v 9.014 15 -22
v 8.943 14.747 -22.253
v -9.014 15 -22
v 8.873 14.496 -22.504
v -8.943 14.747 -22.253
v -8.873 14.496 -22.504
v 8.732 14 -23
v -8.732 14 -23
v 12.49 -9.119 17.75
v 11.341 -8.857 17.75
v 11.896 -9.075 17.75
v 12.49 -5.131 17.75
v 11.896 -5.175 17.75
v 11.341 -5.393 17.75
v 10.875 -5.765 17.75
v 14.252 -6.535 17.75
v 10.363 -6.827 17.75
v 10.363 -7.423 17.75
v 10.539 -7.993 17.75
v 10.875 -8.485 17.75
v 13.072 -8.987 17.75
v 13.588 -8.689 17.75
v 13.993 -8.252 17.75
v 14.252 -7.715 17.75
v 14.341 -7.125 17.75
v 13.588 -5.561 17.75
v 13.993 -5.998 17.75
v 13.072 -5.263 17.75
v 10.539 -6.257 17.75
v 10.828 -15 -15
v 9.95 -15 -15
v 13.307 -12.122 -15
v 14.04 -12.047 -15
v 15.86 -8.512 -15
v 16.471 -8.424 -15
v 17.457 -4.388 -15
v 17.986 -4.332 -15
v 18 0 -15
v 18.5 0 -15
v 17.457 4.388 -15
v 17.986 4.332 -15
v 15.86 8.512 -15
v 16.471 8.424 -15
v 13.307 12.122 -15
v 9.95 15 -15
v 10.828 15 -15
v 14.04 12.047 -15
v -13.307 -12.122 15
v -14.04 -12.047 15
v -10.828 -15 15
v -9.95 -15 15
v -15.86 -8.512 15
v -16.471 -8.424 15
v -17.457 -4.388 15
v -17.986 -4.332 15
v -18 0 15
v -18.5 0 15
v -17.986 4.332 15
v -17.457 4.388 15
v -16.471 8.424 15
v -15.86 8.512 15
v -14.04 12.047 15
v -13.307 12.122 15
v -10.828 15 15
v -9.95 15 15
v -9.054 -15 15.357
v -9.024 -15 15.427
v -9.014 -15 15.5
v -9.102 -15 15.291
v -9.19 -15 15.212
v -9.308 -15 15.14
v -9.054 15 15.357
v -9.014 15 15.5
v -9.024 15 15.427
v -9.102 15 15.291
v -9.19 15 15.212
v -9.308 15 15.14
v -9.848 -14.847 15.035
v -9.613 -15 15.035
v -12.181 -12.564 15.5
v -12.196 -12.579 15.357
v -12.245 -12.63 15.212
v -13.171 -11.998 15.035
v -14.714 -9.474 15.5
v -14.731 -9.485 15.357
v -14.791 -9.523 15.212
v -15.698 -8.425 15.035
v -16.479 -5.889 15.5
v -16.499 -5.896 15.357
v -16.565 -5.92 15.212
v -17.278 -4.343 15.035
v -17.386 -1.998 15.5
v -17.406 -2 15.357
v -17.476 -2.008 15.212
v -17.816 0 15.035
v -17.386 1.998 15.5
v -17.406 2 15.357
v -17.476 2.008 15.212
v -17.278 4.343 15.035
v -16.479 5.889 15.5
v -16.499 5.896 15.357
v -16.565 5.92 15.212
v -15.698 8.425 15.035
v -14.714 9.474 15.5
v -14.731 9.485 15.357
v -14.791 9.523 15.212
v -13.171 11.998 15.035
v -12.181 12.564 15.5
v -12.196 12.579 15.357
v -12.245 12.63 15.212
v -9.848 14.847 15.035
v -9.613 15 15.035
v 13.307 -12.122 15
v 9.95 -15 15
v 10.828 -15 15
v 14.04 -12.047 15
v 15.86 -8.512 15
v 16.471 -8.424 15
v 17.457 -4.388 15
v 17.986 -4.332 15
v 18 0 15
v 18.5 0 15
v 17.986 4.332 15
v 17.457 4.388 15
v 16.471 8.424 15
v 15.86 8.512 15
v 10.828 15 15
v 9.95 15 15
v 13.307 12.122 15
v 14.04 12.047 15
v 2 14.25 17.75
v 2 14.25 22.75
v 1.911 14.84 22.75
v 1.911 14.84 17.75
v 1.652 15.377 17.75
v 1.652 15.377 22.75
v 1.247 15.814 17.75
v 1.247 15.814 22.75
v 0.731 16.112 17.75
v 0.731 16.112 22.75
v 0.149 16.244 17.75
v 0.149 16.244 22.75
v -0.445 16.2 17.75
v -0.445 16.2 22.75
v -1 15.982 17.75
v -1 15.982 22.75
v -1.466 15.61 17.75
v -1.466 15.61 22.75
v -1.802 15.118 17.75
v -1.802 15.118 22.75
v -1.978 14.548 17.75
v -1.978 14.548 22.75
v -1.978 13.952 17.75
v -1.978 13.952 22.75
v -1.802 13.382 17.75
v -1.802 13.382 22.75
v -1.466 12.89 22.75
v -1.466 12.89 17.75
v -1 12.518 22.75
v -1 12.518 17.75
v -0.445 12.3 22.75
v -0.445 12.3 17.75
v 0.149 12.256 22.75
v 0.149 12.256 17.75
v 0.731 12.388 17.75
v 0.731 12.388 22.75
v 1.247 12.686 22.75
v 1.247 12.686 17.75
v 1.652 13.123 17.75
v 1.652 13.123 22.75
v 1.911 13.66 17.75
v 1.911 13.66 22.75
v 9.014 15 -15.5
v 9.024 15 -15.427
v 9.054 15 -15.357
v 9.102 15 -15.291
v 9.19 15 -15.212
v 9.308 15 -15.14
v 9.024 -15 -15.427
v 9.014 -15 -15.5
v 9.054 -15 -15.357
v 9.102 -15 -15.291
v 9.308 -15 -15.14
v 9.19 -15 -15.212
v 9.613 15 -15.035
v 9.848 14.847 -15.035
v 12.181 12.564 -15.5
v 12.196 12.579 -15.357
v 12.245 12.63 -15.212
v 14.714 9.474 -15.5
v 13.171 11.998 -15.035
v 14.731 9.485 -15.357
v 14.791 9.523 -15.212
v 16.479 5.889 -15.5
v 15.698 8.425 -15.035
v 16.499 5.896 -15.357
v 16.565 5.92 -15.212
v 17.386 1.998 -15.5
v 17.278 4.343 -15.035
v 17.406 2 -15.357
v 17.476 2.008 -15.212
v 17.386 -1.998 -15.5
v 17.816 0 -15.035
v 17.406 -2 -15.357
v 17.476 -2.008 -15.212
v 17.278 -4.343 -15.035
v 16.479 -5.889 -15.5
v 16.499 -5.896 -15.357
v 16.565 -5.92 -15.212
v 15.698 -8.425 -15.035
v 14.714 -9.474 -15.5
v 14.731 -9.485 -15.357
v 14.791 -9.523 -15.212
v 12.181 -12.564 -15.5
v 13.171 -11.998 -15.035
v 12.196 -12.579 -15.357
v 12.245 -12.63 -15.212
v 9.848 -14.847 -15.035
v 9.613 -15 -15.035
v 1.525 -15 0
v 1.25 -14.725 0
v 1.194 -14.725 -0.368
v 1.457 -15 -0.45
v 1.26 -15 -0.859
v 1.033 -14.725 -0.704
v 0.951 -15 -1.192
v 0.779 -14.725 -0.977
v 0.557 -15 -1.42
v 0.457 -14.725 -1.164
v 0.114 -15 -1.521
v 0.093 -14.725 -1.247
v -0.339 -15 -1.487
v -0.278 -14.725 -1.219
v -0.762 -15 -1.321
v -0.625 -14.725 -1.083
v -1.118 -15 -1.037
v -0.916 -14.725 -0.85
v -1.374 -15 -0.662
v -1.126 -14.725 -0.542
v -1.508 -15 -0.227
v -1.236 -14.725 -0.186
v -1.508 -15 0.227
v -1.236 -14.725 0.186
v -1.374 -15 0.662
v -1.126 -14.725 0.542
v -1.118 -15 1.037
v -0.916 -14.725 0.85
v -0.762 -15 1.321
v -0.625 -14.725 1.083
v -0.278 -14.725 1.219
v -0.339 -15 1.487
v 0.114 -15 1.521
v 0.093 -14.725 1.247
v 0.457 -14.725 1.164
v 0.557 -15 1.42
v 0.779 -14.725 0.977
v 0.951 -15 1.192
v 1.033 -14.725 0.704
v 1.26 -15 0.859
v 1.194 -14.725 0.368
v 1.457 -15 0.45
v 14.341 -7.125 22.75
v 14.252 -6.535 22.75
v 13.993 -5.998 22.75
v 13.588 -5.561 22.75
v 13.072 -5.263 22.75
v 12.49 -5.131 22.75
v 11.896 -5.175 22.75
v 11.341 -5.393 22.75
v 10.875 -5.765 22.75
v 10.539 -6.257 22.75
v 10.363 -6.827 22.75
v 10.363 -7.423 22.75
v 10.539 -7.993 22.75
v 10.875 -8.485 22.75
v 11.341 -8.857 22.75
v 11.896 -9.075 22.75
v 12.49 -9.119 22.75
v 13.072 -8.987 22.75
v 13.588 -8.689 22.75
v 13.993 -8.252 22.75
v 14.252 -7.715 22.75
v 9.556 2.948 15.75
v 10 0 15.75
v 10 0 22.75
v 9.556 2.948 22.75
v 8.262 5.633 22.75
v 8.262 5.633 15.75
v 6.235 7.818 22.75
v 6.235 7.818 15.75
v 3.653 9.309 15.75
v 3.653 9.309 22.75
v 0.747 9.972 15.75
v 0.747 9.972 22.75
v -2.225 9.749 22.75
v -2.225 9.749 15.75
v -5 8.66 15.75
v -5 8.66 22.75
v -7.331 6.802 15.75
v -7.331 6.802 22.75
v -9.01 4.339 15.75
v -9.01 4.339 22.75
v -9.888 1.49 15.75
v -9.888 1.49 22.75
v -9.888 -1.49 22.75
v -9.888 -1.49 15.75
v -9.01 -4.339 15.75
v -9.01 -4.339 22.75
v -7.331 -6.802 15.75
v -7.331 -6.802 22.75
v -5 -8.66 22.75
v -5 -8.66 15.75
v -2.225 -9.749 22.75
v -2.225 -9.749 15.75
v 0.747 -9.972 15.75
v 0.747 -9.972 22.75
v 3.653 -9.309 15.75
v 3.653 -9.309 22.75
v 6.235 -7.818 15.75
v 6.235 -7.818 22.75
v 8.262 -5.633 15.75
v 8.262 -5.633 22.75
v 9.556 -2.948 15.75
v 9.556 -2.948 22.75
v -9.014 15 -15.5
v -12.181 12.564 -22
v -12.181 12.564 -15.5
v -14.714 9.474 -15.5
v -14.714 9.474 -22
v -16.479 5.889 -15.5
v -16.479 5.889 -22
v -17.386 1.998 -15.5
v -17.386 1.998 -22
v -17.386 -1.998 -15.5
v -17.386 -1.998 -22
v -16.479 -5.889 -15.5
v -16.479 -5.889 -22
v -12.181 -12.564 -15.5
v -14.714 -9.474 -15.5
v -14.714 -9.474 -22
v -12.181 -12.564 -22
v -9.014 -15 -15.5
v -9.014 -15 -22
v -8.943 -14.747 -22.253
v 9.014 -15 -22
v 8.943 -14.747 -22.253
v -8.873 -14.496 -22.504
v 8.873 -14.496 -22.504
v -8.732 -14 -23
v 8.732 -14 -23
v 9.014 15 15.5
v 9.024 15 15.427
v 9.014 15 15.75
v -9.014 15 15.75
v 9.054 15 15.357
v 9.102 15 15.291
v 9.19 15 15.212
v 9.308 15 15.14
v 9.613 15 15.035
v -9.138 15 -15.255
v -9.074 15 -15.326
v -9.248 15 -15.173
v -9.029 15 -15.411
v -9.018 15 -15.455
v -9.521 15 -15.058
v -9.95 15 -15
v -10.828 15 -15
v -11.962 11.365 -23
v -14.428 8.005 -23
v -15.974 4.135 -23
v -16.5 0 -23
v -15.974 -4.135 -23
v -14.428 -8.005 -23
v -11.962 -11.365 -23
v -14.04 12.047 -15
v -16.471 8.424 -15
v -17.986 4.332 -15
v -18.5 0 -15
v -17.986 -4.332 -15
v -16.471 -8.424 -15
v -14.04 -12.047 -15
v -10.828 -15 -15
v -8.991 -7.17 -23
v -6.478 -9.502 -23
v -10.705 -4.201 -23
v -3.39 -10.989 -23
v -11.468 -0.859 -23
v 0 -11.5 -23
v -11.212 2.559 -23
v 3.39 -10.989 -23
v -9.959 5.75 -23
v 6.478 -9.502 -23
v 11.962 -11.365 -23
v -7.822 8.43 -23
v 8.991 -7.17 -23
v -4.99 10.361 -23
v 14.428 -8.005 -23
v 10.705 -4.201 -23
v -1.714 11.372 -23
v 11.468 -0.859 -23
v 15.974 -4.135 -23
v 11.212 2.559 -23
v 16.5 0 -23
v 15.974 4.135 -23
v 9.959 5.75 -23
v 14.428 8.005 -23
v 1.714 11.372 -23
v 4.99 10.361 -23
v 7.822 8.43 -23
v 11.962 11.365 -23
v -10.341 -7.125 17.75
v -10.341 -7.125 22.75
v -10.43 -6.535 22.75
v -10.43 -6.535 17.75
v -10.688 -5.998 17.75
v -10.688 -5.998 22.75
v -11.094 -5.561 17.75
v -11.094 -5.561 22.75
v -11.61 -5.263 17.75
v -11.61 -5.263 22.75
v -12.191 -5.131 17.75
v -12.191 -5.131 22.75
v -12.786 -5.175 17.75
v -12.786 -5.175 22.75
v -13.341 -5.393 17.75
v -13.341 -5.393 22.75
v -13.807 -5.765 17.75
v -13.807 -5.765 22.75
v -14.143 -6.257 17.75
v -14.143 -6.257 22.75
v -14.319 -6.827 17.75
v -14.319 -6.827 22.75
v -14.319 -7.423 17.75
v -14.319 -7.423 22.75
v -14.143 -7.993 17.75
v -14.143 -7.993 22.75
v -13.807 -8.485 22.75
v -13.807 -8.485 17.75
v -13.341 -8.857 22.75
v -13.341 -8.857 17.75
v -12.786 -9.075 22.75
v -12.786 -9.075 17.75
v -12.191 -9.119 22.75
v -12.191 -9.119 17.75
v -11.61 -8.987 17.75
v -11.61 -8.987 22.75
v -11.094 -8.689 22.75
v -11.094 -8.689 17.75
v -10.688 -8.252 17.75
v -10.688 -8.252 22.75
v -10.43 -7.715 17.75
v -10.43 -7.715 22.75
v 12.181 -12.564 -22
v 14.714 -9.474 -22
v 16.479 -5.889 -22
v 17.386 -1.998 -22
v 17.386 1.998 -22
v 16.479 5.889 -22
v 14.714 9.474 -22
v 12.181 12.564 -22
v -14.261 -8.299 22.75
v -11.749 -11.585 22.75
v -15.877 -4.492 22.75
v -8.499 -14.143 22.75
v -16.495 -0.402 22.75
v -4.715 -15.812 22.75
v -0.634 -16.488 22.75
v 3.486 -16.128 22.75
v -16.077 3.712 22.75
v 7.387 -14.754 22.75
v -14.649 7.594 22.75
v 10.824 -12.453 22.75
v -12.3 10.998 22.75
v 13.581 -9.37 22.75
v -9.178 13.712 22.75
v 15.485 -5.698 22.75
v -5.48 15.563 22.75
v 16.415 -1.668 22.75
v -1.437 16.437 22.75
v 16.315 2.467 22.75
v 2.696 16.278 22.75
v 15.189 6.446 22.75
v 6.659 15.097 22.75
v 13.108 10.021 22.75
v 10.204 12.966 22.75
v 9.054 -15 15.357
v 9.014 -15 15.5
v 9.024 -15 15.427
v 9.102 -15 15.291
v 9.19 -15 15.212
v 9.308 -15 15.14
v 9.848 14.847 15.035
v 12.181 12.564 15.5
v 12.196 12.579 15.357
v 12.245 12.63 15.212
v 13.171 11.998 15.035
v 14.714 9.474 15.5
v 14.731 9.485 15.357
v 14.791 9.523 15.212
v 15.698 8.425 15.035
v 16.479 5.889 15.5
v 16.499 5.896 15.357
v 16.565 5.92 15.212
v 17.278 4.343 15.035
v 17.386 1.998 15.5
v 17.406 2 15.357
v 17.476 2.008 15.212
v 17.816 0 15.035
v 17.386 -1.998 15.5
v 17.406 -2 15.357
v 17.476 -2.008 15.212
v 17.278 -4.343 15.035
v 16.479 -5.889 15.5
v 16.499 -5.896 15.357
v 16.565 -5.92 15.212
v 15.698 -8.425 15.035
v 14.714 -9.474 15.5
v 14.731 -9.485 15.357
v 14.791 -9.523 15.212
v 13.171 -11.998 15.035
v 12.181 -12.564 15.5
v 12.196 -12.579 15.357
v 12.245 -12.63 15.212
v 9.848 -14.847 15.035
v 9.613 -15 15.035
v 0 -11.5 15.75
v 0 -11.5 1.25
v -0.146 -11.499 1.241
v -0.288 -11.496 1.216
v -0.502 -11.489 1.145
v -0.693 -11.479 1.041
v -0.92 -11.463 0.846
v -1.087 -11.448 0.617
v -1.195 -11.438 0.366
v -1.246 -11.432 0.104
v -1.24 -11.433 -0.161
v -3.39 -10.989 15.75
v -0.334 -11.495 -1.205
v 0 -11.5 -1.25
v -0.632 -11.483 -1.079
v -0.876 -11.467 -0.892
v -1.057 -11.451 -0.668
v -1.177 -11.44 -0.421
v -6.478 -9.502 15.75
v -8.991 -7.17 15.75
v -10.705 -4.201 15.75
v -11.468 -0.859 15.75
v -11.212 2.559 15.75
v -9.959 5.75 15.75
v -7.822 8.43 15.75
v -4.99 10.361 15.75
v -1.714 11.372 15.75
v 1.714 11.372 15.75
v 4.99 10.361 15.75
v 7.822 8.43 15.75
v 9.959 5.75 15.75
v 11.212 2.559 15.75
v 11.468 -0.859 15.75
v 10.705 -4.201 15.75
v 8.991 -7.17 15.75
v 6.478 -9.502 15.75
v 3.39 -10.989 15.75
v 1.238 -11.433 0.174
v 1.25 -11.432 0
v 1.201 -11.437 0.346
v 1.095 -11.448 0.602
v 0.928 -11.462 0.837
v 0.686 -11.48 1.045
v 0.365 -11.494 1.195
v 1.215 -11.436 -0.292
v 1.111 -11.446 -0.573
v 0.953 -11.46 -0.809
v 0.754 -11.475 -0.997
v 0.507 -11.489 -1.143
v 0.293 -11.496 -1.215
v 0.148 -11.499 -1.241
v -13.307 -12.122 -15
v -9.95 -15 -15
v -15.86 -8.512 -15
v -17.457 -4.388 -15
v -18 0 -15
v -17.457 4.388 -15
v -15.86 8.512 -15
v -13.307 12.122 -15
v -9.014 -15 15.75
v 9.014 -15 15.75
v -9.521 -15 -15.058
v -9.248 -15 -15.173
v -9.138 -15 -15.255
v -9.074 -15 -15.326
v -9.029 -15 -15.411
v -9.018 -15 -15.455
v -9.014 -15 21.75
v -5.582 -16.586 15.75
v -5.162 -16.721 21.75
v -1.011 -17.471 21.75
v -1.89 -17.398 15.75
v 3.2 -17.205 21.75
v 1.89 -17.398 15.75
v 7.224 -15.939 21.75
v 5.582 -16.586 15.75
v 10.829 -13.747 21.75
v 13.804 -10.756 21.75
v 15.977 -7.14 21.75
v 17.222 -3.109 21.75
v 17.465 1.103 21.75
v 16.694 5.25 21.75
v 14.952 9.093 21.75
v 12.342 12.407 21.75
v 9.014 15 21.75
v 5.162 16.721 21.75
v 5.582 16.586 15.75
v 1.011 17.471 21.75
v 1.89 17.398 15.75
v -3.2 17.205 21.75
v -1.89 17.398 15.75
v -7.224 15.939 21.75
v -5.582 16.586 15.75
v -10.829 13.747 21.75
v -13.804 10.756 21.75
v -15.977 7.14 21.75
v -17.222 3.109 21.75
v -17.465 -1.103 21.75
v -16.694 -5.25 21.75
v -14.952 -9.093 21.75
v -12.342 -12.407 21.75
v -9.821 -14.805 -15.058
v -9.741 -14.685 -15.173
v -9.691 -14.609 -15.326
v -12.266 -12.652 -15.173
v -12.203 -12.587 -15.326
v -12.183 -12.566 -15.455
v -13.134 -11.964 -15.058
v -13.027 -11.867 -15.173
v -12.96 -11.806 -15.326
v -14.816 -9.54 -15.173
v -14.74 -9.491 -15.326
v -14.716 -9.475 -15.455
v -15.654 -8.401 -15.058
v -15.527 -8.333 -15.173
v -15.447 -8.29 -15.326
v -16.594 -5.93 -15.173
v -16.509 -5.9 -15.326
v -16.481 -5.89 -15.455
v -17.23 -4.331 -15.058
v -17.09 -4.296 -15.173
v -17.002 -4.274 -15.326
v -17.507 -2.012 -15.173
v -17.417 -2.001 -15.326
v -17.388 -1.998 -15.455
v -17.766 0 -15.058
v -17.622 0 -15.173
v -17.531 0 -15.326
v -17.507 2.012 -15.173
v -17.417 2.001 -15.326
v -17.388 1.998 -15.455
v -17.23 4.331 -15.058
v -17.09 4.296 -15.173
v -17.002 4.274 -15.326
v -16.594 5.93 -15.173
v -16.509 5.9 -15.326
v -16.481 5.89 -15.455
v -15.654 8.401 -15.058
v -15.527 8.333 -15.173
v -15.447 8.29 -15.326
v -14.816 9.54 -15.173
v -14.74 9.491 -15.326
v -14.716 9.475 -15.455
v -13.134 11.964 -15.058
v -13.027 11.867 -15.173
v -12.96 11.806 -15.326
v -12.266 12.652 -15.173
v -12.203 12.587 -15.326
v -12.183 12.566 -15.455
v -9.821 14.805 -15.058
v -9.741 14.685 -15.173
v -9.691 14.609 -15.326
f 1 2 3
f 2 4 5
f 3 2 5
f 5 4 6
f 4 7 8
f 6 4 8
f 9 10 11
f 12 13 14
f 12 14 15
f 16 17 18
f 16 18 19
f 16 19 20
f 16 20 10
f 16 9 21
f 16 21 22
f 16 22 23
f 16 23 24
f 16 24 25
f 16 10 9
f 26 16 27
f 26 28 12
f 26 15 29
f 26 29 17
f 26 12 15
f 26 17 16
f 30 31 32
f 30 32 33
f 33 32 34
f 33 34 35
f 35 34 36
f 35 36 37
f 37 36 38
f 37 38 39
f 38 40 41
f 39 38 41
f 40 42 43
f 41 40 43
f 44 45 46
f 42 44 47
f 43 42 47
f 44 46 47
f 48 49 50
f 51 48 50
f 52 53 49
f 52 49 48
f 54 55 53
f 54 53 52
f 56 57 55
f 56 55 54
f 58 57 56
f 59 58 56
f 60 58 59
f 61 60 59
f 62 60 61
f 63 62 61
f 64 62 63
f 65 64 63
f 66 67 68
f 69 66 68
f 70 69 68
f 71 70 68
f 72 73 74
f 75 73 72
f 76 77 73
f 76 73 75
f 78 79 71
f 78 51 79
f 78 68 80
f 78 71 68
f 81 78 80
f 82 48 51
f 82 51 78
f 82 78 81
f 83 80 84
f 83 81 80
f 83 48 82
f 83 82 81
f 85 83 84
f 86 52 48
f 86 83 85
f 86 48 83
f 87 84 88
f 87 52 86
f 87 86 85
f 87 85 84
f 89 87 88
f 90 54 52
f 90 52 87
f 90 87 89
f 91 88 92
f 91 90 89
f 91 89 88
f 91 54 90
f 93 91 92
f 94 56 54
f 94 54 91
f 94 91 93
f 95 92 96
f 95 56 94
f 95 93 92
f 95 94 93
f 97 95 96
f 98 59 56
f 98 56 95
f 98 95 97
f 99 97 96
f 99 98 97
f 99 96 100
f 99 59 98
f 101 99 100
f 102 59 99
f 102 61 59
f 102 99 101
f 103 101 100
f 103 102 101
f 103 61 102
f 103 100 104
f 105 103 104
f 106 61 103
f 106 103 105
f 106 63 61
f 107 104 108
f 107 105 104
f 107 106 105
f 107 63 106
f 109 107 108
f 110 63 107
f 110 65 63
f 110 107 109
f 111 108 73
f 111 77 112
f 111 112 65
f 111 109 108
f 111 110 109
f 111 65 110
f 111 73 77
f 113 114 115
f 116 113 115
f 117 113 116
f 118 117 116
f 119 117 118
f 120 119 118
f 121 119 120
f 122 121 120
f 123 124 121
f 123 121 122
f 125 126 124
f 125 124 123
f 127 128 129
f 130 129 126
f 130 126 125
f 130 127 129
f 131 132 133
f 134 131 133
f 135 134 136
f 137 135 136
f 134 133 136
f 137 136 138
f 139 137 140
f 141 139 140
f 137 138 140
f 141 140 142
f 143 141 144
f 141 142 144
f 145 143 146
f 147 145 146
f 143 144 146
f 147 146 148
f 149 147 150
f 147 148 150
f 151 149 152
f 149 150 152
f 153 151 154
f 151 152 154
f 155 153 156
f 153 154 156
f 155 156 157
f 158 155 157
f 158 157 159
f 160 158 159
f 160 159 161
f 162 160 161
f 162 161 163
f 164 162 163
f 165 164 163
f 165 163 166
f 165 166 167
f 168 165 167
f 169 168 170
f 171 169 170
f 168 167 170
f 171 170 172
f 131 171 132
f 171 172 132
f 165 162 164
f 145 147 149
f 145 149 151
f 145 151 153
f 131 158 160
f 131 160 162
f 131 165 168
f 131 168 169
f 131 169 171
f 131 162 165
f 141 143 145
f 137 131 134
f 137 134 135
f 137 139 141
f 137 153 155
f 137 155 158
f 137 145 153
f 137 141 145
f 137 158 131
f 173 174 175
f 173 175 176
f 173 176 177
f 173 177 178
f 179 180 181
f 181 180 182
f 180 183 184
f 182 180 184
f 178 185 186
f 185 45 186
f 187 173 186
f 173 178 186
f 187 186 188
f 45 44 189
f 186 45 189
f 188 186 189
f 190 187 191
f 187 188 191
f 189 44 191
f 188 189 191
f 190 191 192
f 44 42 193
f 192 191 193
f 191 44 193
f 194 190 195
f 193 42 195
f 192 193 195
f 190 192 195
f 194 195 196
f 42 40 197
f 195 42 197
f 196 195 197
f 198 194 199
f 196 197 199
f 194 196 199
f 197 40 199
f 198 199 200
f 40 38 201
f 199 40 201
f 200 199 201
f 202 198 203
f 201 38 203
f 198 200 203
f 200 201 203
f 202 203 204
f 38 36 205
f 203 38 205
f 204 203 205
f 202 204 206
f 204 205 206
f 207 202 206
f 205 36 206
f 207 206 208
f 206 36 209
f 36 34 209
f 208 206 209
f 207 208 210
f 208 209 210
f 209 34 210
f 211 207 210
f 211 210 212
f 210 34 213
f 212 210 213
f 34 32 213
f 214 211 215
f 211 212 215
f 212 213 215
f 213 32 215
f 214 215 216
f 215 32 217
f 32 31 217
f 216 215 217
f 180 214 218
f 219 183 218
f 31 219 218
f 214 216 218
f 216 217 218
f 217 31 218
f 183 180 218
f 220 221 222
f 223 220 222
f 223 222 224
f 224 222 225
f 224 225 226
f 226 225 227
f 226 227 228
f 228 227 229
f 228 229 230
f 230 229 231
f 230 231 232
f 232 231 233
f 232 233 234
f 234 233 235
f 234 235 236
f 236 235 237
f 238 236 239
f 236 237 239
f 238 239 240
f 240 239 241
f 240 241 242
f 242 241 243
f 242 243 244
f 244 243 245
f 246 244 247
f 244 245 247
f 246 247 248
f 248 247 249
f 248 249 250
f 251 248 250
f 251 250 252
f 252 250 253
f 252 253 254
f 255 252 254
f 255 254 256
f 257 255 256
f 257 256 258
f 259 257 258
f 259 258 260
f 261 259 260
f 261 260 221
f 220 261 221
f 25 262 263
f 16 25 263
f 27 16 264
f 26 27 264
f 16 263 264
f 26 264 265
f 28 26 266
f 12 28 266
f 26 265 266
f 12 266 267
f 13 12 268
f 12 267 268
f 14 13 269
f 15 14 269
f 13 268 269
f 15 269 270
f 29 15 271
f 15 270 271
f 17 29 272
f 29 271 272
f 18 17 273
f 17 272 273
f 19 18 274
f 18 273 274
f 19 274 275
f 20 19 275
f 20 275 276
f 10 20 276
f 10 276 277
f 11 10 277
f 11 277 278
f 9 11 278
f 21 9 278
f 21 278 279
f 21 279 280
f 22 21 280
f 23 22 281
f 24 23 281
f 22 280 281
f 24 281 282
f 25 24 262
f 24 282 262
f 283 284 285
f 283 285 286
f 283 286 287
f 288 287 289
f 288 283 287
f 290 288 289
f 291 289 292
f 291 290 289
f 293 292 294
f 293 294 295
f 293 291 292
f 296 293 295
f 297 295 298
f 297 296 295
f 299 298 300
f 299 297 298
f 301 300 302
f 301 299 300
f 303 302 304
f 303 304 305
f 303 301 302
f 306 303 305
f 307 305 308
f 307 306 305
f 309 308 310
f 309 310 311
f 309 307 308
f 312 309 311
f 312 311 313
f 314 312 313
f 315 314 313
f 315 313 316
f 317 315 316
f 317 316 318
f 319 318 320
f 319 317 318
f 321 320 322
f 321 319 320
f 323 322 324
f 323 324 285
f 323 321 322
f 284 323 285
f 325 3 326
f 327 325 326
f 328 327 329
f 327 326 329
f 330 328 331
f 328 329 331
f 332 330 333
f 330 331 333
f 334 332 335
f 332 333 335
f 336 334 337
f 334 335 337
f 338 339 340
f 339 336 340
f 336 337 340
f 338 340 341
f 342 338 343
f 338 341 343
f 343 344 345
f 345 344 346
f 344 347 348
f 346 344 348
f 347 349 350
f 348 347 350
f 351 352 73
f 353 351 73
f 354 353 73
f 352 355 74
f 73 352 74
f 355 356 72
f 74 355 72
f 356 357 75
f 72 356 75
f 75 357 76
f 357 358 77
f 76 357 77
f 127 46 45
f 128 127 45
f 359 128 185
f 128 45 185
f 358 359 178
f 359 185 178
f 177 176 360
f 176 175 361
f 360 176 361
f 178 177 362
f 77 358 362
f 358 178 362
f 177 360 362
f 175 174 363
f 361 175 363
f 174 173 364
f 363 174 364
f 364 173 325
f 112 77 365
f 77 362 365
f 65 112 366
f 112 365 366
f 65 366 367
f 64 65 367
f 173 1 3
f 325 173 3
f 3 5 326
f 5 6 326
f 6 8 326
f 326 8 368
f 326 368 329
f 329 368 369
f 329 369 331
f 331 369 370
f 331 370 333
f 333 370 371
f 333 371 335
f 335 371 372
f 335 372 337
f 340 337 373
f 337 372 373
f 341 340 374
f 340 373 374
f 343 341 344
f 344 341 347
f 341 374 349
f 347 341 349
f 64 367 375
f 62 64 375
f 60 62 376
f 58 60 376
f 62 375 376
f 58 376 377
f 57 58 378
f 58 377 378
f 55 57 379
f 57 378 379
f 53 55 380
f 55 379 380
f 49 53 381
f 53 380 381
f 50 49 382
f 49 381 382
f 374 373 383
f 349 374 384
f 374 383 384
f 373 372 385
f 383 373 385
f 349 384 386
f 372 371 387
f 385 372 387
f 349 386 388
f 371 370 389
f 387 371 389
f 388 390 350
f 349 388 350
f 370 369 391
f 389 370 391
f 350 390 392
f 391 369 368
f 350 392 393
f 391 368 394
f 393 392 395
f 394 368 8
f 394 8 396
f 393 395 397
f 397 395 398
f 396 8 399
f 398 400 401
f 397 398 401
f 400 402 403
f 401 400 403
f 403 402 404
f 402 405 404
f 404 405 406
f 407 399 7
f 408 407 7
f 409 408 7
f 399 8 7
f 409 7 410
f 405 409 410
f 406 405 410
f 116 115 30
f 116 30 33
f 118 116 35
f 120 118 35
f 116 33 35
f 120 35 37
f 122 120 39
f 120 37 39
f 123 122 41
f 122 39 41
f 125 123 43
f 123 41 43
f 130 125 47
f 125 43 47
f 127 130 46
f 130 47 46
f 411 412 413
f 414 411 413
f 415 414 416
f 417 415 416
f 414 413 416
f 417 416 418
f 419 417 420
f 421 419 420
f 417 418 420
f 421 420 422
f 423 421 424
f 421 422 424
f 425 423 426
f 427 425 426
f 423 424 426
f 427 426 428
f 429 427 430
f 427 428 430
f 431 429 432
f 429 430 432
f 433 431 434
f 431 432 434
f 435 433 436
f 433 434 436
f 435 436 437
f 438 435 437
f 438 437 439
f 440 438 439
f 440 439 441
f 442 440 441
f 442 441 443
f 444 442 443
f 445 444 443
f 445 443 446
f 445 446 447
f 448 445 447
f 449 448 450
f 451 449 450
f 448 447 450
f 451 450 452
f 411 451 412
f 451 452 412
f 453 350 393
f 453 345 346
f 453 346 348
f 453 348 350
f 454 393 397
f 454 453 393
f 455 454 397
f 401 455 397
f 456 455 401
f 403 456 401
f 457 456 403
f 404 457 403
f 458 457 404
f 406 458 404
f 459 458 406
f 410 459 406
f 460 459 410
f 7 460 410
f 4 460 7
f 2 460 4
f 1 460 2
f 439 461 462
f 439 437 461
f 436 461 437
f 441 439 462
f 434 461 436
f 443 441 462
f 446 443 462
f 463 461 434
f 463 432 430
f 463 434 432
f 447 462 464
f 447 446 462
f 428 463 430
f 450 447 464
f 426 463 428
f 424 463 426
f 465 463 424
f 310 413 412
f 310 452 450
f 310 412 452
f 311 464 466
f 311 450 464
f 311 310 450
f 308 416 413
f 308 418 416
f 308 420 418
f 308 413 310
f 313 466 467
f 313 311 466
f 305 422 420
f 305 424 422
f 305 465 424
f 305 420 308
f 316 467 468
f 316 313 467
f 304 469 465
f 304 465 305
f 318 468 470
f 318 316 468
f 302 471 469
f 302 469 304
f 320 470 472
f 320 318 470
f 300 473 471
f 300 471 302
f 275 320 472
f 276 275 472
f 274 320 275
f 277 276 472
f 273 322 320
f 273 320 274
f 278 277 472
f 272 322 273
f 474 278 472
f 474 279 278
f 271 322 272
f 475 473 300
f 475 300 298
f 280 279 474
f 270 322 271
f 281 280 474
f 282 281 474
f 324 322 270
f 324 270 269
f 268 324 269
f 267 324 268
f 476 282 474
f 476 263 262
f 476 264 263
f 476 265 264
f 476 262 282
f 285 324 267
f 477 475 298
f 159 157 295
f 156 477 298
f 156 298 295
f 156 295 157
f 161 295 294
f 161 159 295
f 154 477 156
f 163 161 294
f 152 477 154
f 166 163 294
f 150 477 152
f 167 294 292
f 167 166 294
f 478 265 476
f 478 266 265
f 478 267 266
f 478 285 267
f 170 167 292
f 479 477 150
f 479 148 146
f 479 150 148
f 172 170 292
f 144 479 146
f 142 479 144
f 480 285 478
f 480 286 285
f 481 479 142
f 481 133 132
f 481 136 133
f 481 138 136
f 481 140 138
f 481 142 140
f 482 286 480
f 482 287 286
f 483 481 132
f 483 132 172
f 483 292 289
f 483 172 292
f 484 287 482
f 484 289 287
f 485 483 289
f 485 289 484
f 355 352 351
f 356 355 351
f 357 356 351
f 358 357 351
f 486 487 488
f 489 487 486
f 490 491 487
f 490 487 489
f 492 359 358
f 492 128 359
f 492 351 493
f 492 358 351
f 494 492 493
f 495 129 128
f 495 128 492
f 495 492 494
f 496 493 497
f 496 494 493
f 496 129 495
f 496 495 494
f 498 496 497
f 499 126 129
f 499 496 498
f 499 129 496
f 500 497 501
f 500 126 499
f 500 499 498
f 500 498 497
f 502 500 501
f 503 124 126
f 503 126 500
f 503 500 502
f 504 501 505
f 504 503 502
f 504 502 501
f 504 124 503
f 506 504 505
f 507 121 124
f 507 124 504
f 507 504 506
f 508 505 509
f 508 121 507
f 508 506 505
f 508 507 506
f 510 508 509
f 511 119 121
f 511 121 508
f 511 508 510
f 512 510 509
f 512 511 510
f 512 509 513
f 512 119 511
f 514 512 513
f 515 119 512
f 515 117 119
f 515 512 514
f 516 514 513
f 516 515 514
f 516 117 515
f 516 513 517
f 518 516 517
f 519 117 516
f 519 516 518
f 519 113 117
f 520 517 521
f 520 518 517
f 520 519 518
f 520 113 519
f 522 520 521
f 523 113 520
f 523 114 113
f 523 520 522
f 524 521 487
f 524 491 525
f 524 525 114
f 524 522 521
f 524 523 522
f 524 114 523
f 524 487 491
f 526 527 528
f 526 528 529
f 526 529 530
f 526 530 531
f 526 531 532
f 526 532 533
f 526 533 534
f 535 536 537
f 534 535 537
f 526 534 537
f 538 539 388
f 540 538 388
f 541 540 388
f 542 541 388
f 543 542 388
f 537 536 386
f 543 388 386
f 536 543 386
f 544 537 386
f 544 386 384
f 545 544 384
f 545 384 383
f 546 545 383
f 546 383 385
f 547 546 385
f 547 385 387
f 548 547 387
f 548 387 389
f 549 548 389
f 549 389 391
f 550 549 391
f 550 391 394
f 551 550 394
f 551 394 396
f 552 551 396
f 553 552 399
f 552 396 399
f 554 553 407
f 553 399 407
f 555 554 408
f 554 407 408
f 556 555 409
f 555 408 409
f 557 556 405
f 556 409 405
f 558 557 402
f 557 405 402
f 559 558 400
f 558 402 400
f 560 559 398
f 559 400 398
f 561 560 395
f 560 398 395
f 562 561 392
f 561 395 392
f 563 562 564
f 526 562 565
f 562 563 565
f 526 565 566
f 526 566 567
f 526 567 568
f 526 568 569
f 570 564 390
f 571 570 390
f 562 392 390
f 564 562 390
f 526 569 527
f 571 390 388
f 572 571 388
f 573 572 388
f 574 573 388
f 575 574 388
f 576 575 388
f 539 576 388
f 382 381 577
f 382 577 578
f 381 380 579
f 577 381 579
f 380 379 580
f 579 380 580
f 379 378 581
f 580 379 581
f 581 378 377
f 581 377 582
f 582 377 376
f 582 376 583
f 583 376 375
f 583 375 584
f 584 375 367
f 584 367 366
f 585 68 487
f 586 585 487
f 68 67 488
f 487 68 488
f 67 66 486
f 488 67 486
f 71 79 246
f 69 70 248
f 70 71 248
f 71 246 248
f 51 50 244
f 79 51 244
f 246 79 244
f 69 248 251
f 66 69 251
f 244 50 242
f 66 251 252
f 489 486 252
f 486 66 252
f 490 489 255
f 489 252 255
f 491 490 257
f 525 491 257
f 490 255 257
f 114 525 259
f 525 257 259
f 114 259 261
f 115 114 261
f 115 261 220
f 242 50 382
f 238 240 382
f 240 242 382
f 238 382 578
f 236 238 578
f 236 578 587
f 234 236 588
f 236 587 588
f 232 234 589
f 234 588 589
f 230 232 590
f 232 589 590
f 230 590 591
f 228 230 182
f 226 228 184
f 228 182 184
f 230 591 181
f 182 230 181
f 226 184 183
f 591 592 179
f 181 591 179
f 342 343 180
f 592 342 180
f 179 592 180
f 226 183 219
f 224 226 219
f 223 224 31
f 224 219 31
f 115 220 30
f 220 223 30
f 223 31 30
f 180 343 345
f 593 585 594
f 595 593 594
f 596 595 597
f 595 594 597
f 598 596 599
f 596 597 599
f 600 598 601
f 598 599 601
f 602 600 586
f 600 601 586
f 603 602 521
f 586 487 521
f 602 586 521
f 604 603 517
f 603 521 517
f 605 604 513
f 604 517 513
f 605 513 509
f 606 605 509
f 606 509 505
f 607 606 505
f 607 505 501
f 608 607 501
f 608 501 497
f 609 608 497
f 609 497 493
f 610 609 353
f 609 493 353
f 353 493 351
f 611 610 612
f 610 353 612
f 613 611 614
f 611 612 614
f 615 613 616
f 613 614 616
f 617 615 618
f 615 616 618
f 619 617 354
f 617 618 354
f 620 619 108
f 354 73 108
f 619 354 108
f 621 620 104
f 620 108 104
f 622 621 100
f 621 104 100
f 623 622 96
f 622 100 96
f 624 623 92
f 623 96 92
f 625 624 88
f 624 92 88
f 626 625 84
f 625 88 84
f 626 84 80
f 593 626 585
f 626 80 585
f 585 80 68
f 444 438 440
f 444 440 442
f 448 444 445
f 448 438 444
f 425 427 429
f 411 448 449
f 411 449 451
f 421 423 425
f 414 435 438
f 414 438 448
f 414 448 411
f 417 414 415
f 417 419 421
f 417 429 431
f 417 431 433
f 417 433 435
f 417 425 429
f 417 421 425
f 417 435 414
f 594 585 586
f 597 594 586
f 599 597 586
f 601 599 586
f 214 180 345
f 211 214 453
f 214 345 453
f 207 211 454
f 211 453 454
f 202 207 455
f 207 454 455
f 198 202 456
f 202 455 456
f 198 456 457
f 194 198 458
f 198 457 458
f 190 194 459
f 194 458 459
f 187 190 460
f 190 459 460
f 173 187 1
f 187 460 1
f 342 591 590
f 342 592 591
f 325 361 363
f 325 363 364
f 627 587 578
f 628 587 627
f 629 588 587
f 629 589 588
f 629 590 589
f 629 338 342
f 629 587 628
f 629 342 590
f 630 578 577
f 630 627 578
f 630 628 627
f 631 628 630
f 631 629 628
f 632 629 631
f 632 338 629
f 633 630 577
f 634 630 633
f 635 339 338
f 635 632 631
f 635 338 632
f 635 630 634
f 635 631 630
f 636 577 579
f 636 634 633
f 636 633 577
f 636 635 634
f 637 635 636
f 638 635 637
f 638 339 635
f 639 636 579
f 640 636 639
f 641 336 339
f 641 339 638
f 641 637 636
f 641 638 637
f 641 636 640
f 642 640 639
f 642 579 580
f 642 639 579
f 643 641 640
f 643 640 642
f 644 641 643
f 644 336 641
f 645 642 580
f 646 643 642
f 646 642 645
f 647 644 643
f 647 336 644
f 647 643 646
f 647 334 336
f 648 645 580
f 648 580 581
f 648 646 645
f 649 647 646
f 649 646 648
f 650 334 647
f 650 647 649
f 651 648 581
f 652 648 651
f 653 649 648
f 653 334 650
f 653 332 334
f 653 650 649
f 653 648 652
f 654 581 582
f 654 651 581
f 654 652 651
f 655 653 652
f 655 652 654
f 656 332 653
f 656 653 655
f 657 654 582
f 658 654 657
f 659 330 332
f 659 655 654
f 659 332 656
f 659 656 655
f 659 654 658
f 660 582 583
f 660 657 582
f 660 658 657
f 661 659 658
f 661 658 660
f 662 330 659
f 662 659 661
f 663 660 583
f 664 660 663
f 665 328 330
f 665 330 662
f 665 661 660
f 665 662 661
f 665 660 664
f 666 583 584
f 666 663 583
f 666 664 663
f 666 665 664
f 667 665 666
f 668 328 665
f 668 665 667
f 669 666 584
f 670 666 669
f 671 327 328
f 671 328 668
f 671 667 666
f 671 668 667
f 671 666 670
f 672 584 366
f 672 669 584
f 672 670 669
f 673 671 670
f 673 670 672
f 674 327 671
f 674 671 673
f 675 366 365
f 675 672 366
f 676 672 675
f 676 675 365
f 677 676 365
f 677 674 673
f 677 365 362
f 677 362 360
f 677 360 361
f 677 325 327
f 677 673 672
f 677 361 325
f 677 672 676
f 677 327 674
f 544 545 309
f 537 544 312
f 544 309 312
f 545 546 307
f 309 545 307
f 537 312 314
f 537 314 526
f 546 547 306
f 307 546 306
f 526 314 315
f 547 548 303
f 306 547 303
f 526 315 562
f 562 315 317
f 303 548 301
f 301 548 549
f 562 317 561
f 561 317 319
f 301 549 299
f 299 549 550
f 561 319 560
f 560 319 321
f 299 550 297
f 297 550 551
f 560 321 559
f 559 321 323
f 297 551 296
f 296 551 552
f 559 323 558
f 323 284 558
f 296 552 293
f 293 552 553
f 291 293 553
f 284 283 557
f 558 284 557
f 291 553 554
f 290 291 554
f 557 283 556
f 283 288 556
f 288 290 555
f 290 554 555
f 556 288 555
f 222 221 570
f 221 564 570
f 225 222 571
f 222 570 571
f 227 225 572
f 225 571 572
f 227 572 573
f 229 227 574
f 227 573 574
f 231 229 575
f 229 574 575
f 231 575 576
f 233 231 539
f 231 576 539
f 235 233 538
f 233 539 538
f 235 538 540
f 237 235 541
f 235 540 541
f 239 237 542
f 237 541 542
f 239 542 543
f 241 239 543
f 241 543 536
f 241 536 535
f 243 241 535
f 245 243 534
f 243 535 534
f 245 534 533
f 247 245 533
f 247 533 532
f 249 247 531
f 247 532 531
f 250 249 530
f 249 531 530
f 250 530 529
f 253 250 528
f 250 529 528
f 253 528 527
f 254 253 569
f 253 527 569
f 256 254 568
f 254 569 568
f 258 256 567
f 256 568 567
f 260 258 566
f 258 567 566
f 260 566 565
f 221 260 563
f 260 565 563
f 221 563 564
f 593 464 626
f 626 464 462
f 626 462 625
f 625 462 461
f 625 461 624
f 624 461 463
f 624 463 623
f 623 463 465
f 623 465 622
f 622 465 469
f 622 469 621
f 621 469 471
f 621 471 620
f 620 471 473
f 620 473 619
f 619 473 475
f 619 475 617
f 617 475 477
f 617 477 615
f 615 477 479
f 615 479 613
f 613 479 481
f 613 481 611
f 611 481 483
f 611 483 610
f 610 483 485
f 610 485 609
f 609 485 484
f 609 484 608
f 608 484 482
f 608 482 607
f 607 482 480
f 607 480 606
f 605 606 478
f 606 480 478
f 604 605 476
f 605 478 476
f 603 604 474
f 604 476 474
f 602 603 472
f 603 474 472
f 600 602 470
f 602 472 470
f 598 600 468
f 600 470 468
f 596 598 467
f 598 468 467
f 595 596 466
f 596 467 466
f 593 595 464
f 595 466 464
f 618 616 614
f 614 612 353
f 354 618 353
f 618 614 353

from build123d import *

# Parameters (mm, degrees)
BOSS_EXTRUDE1_DEPTH         = 22.75
BOSS_EXTRUDE1_DEPTH_BACK    = 23
SKETCH1_R                   = 11.5
BOSS_EXTRUDE2_DEPTH         = 15
BOSS_EXTRUDE2_DEPTH_BACK    = 15
BOSS_EXTRUDE3_START         = -7
SKETCH5_R                   = 17.5
SKETCH5_R_2                 = 10
BOSS_EXTRUDE3_DEPTH         = 7
SKETCH6_R                   = 2
CUT_EXTRUDE1_DEPTH          = 5
M3_TAPPED_HOLE1_D           = 2.5
M3_TAPPED_HOLE1_DEPTH       = 7.5
M3_TAPPED_HOLE1_CSINK_D     = 3.05
M3_TAPPED_HOLE1_CSINK_ANGLE = 90
M3_TAPPED_HOLE1_TIP         = 0.751075774
FILLET2_R                   = 0.5
CHAMFER1_SIZE               = 1
CHAMFER2_SIZE               = 1


with BuildPart() as part:
    # Sketch1 → Boss-Extrude1 (new, two sides: drawn at the far end of the back side and taken through both)
    with BuildSketch(Plane.XY.offset(-BOSS_EXTRUDE1_DEPTH_BACK)):
        with BuildLine():
            Line((9.013878189, 15), (-9.013878189, 15))
            ThreePointArc((-9.013878189, 15), (-17.5, 0), (-9.013878189, -15))
            Line((-9.013878189, -15), (9.013878189, -15))
            ThreePointArc((9.013878189, -15), (17.5, 0), (9.013878189, 15))
        make_face()
        Circle(SKETCH1_R, mode=Mode.SUBTRACT)
    extrude(amount=BOSS_EXTRUDE1_DEPTH + BOSS_EXTRUDE1_DEPTH_BACK)

    # Sketch1<23> → Boss-Extrude2 (add, two sides: drawn at the far end of the back side and taken through both)
    with BuildSketch(Plane.XY.offset(-BOSS_EXTRUDE2_DEPTH_BACK)):
        with BuildLine():
            Line((-9.013878189, 15), (-10.828203914, 15))
            ThreePointArc((-10.828203914, 15), (-18.5, 0), (-10.828203914, -15))
            Line((-10.828203914, -15), (-9.013878189, -15))
            ThreePointArc((-9.013878189, -15), (-17.5, 0), (-9.013878189, 15))
        make_face()
        with BuildLine():
            ThreePointArc((10.828203914, -15), (18.5, 0), (10.828203914, 15))
            Line((10.828203914, 15), (9.013878189, 15))
            ThreePointArc((9.013878189, 15), (17.5, 0), (9.013878189, -15))
            Line((9.013878189, -15), (10.828203914, -15))
        make_face()
    extrude(amount=BOSS_EXTRUDE2_DEPTH + BOSS_EXTRUDE2_DEPTH_BACK)

    # Sketch5 → Boss-Extrude3 (add)
    with BuildSketch(Plane.XY.offset(22.75).offset(BOSS_EXTRUDE3_START)):
        Circle(SKETCH5_R)
        Circle(SKETCH5_R_2, mode=Mode.SUBTRACT)
    extrude(amount=BOSS_EXTRUDE3_DEPTH)

    # Sketch6 → Cut-Extrude1 (cut)
    with BuildSketch(Plane.XY.offset(22.75)):
        with Locations((0, 14.25)):
            Circle(SKETCH6_R)
        with Locations((12.340862004, -7.125)):
            Circle(SKETCH6_R)
        with Locations((-12.340862004, -7.125)):
            Circle(SKETCH6_R)
    extrude(amount=-CUT_EXTRUDE1_DEPTH, mode=Mode.SUBTRACT)

    # M3 Tapped Hole1
    with Locations(Plane(origin=(0, -15, 0), x_dir=(-1, 0, 0), z_dir=(0, -1, 0))):
        with Locations((0, 0)):
            CounterSinkHole(M3_TAPPED_HOLE1_D / 2, M3_TAPPED_HOLE1_CSINK_D / 2, depth=M3_TAPPED_HOLE1_DEPTH, counter_sink_angle=M3_TAPPED_HOLE1_CSINK_ANGLE)
            with Locations((0, 0, -(M3_TAPPED_HOLE1_DEPTH + M3_TAPPED_HOLE1_TIP / 2))):  # 118° drill point
                Cone(0, M3_TAPPED_HOLE1_D / 2, M3_TAPPED_HOLE1_TIP, mode=Mode.SUBTRACT)

    # Fillet2
    fillet2_edges = [part.edges().sort_by_distance(p)[0] for p in [
        (-17.5, 0, -15),
        (17.5, 0, -15),
        (17.5, 0, 15),
        (-17.5, 0, 15),
    ]]
    fillet(fillet2_edges, radius=FILLET2_R)

    # Chamfer1
    chamfer1_edges = [part.edges().sort_by_distance(p)[0] for p in [
        (-9.013878189, 15, 22.75),
        (17.5, 0, -23),
        (-17.5, 0, -23),
    ]]
    chamfer(chamfer1_edges, length=CHAMFER1_SIZE)

    # Chamfer2
    chamfer2_edges = [part.edges().sort_by_distance(p)[0] for p in [
        (0, -15, -23),
        (0, 15, -23),
    ]]
    chamfer(chamfer2_edges, length=CHAMFER2_SIZE)


solid = part.part
